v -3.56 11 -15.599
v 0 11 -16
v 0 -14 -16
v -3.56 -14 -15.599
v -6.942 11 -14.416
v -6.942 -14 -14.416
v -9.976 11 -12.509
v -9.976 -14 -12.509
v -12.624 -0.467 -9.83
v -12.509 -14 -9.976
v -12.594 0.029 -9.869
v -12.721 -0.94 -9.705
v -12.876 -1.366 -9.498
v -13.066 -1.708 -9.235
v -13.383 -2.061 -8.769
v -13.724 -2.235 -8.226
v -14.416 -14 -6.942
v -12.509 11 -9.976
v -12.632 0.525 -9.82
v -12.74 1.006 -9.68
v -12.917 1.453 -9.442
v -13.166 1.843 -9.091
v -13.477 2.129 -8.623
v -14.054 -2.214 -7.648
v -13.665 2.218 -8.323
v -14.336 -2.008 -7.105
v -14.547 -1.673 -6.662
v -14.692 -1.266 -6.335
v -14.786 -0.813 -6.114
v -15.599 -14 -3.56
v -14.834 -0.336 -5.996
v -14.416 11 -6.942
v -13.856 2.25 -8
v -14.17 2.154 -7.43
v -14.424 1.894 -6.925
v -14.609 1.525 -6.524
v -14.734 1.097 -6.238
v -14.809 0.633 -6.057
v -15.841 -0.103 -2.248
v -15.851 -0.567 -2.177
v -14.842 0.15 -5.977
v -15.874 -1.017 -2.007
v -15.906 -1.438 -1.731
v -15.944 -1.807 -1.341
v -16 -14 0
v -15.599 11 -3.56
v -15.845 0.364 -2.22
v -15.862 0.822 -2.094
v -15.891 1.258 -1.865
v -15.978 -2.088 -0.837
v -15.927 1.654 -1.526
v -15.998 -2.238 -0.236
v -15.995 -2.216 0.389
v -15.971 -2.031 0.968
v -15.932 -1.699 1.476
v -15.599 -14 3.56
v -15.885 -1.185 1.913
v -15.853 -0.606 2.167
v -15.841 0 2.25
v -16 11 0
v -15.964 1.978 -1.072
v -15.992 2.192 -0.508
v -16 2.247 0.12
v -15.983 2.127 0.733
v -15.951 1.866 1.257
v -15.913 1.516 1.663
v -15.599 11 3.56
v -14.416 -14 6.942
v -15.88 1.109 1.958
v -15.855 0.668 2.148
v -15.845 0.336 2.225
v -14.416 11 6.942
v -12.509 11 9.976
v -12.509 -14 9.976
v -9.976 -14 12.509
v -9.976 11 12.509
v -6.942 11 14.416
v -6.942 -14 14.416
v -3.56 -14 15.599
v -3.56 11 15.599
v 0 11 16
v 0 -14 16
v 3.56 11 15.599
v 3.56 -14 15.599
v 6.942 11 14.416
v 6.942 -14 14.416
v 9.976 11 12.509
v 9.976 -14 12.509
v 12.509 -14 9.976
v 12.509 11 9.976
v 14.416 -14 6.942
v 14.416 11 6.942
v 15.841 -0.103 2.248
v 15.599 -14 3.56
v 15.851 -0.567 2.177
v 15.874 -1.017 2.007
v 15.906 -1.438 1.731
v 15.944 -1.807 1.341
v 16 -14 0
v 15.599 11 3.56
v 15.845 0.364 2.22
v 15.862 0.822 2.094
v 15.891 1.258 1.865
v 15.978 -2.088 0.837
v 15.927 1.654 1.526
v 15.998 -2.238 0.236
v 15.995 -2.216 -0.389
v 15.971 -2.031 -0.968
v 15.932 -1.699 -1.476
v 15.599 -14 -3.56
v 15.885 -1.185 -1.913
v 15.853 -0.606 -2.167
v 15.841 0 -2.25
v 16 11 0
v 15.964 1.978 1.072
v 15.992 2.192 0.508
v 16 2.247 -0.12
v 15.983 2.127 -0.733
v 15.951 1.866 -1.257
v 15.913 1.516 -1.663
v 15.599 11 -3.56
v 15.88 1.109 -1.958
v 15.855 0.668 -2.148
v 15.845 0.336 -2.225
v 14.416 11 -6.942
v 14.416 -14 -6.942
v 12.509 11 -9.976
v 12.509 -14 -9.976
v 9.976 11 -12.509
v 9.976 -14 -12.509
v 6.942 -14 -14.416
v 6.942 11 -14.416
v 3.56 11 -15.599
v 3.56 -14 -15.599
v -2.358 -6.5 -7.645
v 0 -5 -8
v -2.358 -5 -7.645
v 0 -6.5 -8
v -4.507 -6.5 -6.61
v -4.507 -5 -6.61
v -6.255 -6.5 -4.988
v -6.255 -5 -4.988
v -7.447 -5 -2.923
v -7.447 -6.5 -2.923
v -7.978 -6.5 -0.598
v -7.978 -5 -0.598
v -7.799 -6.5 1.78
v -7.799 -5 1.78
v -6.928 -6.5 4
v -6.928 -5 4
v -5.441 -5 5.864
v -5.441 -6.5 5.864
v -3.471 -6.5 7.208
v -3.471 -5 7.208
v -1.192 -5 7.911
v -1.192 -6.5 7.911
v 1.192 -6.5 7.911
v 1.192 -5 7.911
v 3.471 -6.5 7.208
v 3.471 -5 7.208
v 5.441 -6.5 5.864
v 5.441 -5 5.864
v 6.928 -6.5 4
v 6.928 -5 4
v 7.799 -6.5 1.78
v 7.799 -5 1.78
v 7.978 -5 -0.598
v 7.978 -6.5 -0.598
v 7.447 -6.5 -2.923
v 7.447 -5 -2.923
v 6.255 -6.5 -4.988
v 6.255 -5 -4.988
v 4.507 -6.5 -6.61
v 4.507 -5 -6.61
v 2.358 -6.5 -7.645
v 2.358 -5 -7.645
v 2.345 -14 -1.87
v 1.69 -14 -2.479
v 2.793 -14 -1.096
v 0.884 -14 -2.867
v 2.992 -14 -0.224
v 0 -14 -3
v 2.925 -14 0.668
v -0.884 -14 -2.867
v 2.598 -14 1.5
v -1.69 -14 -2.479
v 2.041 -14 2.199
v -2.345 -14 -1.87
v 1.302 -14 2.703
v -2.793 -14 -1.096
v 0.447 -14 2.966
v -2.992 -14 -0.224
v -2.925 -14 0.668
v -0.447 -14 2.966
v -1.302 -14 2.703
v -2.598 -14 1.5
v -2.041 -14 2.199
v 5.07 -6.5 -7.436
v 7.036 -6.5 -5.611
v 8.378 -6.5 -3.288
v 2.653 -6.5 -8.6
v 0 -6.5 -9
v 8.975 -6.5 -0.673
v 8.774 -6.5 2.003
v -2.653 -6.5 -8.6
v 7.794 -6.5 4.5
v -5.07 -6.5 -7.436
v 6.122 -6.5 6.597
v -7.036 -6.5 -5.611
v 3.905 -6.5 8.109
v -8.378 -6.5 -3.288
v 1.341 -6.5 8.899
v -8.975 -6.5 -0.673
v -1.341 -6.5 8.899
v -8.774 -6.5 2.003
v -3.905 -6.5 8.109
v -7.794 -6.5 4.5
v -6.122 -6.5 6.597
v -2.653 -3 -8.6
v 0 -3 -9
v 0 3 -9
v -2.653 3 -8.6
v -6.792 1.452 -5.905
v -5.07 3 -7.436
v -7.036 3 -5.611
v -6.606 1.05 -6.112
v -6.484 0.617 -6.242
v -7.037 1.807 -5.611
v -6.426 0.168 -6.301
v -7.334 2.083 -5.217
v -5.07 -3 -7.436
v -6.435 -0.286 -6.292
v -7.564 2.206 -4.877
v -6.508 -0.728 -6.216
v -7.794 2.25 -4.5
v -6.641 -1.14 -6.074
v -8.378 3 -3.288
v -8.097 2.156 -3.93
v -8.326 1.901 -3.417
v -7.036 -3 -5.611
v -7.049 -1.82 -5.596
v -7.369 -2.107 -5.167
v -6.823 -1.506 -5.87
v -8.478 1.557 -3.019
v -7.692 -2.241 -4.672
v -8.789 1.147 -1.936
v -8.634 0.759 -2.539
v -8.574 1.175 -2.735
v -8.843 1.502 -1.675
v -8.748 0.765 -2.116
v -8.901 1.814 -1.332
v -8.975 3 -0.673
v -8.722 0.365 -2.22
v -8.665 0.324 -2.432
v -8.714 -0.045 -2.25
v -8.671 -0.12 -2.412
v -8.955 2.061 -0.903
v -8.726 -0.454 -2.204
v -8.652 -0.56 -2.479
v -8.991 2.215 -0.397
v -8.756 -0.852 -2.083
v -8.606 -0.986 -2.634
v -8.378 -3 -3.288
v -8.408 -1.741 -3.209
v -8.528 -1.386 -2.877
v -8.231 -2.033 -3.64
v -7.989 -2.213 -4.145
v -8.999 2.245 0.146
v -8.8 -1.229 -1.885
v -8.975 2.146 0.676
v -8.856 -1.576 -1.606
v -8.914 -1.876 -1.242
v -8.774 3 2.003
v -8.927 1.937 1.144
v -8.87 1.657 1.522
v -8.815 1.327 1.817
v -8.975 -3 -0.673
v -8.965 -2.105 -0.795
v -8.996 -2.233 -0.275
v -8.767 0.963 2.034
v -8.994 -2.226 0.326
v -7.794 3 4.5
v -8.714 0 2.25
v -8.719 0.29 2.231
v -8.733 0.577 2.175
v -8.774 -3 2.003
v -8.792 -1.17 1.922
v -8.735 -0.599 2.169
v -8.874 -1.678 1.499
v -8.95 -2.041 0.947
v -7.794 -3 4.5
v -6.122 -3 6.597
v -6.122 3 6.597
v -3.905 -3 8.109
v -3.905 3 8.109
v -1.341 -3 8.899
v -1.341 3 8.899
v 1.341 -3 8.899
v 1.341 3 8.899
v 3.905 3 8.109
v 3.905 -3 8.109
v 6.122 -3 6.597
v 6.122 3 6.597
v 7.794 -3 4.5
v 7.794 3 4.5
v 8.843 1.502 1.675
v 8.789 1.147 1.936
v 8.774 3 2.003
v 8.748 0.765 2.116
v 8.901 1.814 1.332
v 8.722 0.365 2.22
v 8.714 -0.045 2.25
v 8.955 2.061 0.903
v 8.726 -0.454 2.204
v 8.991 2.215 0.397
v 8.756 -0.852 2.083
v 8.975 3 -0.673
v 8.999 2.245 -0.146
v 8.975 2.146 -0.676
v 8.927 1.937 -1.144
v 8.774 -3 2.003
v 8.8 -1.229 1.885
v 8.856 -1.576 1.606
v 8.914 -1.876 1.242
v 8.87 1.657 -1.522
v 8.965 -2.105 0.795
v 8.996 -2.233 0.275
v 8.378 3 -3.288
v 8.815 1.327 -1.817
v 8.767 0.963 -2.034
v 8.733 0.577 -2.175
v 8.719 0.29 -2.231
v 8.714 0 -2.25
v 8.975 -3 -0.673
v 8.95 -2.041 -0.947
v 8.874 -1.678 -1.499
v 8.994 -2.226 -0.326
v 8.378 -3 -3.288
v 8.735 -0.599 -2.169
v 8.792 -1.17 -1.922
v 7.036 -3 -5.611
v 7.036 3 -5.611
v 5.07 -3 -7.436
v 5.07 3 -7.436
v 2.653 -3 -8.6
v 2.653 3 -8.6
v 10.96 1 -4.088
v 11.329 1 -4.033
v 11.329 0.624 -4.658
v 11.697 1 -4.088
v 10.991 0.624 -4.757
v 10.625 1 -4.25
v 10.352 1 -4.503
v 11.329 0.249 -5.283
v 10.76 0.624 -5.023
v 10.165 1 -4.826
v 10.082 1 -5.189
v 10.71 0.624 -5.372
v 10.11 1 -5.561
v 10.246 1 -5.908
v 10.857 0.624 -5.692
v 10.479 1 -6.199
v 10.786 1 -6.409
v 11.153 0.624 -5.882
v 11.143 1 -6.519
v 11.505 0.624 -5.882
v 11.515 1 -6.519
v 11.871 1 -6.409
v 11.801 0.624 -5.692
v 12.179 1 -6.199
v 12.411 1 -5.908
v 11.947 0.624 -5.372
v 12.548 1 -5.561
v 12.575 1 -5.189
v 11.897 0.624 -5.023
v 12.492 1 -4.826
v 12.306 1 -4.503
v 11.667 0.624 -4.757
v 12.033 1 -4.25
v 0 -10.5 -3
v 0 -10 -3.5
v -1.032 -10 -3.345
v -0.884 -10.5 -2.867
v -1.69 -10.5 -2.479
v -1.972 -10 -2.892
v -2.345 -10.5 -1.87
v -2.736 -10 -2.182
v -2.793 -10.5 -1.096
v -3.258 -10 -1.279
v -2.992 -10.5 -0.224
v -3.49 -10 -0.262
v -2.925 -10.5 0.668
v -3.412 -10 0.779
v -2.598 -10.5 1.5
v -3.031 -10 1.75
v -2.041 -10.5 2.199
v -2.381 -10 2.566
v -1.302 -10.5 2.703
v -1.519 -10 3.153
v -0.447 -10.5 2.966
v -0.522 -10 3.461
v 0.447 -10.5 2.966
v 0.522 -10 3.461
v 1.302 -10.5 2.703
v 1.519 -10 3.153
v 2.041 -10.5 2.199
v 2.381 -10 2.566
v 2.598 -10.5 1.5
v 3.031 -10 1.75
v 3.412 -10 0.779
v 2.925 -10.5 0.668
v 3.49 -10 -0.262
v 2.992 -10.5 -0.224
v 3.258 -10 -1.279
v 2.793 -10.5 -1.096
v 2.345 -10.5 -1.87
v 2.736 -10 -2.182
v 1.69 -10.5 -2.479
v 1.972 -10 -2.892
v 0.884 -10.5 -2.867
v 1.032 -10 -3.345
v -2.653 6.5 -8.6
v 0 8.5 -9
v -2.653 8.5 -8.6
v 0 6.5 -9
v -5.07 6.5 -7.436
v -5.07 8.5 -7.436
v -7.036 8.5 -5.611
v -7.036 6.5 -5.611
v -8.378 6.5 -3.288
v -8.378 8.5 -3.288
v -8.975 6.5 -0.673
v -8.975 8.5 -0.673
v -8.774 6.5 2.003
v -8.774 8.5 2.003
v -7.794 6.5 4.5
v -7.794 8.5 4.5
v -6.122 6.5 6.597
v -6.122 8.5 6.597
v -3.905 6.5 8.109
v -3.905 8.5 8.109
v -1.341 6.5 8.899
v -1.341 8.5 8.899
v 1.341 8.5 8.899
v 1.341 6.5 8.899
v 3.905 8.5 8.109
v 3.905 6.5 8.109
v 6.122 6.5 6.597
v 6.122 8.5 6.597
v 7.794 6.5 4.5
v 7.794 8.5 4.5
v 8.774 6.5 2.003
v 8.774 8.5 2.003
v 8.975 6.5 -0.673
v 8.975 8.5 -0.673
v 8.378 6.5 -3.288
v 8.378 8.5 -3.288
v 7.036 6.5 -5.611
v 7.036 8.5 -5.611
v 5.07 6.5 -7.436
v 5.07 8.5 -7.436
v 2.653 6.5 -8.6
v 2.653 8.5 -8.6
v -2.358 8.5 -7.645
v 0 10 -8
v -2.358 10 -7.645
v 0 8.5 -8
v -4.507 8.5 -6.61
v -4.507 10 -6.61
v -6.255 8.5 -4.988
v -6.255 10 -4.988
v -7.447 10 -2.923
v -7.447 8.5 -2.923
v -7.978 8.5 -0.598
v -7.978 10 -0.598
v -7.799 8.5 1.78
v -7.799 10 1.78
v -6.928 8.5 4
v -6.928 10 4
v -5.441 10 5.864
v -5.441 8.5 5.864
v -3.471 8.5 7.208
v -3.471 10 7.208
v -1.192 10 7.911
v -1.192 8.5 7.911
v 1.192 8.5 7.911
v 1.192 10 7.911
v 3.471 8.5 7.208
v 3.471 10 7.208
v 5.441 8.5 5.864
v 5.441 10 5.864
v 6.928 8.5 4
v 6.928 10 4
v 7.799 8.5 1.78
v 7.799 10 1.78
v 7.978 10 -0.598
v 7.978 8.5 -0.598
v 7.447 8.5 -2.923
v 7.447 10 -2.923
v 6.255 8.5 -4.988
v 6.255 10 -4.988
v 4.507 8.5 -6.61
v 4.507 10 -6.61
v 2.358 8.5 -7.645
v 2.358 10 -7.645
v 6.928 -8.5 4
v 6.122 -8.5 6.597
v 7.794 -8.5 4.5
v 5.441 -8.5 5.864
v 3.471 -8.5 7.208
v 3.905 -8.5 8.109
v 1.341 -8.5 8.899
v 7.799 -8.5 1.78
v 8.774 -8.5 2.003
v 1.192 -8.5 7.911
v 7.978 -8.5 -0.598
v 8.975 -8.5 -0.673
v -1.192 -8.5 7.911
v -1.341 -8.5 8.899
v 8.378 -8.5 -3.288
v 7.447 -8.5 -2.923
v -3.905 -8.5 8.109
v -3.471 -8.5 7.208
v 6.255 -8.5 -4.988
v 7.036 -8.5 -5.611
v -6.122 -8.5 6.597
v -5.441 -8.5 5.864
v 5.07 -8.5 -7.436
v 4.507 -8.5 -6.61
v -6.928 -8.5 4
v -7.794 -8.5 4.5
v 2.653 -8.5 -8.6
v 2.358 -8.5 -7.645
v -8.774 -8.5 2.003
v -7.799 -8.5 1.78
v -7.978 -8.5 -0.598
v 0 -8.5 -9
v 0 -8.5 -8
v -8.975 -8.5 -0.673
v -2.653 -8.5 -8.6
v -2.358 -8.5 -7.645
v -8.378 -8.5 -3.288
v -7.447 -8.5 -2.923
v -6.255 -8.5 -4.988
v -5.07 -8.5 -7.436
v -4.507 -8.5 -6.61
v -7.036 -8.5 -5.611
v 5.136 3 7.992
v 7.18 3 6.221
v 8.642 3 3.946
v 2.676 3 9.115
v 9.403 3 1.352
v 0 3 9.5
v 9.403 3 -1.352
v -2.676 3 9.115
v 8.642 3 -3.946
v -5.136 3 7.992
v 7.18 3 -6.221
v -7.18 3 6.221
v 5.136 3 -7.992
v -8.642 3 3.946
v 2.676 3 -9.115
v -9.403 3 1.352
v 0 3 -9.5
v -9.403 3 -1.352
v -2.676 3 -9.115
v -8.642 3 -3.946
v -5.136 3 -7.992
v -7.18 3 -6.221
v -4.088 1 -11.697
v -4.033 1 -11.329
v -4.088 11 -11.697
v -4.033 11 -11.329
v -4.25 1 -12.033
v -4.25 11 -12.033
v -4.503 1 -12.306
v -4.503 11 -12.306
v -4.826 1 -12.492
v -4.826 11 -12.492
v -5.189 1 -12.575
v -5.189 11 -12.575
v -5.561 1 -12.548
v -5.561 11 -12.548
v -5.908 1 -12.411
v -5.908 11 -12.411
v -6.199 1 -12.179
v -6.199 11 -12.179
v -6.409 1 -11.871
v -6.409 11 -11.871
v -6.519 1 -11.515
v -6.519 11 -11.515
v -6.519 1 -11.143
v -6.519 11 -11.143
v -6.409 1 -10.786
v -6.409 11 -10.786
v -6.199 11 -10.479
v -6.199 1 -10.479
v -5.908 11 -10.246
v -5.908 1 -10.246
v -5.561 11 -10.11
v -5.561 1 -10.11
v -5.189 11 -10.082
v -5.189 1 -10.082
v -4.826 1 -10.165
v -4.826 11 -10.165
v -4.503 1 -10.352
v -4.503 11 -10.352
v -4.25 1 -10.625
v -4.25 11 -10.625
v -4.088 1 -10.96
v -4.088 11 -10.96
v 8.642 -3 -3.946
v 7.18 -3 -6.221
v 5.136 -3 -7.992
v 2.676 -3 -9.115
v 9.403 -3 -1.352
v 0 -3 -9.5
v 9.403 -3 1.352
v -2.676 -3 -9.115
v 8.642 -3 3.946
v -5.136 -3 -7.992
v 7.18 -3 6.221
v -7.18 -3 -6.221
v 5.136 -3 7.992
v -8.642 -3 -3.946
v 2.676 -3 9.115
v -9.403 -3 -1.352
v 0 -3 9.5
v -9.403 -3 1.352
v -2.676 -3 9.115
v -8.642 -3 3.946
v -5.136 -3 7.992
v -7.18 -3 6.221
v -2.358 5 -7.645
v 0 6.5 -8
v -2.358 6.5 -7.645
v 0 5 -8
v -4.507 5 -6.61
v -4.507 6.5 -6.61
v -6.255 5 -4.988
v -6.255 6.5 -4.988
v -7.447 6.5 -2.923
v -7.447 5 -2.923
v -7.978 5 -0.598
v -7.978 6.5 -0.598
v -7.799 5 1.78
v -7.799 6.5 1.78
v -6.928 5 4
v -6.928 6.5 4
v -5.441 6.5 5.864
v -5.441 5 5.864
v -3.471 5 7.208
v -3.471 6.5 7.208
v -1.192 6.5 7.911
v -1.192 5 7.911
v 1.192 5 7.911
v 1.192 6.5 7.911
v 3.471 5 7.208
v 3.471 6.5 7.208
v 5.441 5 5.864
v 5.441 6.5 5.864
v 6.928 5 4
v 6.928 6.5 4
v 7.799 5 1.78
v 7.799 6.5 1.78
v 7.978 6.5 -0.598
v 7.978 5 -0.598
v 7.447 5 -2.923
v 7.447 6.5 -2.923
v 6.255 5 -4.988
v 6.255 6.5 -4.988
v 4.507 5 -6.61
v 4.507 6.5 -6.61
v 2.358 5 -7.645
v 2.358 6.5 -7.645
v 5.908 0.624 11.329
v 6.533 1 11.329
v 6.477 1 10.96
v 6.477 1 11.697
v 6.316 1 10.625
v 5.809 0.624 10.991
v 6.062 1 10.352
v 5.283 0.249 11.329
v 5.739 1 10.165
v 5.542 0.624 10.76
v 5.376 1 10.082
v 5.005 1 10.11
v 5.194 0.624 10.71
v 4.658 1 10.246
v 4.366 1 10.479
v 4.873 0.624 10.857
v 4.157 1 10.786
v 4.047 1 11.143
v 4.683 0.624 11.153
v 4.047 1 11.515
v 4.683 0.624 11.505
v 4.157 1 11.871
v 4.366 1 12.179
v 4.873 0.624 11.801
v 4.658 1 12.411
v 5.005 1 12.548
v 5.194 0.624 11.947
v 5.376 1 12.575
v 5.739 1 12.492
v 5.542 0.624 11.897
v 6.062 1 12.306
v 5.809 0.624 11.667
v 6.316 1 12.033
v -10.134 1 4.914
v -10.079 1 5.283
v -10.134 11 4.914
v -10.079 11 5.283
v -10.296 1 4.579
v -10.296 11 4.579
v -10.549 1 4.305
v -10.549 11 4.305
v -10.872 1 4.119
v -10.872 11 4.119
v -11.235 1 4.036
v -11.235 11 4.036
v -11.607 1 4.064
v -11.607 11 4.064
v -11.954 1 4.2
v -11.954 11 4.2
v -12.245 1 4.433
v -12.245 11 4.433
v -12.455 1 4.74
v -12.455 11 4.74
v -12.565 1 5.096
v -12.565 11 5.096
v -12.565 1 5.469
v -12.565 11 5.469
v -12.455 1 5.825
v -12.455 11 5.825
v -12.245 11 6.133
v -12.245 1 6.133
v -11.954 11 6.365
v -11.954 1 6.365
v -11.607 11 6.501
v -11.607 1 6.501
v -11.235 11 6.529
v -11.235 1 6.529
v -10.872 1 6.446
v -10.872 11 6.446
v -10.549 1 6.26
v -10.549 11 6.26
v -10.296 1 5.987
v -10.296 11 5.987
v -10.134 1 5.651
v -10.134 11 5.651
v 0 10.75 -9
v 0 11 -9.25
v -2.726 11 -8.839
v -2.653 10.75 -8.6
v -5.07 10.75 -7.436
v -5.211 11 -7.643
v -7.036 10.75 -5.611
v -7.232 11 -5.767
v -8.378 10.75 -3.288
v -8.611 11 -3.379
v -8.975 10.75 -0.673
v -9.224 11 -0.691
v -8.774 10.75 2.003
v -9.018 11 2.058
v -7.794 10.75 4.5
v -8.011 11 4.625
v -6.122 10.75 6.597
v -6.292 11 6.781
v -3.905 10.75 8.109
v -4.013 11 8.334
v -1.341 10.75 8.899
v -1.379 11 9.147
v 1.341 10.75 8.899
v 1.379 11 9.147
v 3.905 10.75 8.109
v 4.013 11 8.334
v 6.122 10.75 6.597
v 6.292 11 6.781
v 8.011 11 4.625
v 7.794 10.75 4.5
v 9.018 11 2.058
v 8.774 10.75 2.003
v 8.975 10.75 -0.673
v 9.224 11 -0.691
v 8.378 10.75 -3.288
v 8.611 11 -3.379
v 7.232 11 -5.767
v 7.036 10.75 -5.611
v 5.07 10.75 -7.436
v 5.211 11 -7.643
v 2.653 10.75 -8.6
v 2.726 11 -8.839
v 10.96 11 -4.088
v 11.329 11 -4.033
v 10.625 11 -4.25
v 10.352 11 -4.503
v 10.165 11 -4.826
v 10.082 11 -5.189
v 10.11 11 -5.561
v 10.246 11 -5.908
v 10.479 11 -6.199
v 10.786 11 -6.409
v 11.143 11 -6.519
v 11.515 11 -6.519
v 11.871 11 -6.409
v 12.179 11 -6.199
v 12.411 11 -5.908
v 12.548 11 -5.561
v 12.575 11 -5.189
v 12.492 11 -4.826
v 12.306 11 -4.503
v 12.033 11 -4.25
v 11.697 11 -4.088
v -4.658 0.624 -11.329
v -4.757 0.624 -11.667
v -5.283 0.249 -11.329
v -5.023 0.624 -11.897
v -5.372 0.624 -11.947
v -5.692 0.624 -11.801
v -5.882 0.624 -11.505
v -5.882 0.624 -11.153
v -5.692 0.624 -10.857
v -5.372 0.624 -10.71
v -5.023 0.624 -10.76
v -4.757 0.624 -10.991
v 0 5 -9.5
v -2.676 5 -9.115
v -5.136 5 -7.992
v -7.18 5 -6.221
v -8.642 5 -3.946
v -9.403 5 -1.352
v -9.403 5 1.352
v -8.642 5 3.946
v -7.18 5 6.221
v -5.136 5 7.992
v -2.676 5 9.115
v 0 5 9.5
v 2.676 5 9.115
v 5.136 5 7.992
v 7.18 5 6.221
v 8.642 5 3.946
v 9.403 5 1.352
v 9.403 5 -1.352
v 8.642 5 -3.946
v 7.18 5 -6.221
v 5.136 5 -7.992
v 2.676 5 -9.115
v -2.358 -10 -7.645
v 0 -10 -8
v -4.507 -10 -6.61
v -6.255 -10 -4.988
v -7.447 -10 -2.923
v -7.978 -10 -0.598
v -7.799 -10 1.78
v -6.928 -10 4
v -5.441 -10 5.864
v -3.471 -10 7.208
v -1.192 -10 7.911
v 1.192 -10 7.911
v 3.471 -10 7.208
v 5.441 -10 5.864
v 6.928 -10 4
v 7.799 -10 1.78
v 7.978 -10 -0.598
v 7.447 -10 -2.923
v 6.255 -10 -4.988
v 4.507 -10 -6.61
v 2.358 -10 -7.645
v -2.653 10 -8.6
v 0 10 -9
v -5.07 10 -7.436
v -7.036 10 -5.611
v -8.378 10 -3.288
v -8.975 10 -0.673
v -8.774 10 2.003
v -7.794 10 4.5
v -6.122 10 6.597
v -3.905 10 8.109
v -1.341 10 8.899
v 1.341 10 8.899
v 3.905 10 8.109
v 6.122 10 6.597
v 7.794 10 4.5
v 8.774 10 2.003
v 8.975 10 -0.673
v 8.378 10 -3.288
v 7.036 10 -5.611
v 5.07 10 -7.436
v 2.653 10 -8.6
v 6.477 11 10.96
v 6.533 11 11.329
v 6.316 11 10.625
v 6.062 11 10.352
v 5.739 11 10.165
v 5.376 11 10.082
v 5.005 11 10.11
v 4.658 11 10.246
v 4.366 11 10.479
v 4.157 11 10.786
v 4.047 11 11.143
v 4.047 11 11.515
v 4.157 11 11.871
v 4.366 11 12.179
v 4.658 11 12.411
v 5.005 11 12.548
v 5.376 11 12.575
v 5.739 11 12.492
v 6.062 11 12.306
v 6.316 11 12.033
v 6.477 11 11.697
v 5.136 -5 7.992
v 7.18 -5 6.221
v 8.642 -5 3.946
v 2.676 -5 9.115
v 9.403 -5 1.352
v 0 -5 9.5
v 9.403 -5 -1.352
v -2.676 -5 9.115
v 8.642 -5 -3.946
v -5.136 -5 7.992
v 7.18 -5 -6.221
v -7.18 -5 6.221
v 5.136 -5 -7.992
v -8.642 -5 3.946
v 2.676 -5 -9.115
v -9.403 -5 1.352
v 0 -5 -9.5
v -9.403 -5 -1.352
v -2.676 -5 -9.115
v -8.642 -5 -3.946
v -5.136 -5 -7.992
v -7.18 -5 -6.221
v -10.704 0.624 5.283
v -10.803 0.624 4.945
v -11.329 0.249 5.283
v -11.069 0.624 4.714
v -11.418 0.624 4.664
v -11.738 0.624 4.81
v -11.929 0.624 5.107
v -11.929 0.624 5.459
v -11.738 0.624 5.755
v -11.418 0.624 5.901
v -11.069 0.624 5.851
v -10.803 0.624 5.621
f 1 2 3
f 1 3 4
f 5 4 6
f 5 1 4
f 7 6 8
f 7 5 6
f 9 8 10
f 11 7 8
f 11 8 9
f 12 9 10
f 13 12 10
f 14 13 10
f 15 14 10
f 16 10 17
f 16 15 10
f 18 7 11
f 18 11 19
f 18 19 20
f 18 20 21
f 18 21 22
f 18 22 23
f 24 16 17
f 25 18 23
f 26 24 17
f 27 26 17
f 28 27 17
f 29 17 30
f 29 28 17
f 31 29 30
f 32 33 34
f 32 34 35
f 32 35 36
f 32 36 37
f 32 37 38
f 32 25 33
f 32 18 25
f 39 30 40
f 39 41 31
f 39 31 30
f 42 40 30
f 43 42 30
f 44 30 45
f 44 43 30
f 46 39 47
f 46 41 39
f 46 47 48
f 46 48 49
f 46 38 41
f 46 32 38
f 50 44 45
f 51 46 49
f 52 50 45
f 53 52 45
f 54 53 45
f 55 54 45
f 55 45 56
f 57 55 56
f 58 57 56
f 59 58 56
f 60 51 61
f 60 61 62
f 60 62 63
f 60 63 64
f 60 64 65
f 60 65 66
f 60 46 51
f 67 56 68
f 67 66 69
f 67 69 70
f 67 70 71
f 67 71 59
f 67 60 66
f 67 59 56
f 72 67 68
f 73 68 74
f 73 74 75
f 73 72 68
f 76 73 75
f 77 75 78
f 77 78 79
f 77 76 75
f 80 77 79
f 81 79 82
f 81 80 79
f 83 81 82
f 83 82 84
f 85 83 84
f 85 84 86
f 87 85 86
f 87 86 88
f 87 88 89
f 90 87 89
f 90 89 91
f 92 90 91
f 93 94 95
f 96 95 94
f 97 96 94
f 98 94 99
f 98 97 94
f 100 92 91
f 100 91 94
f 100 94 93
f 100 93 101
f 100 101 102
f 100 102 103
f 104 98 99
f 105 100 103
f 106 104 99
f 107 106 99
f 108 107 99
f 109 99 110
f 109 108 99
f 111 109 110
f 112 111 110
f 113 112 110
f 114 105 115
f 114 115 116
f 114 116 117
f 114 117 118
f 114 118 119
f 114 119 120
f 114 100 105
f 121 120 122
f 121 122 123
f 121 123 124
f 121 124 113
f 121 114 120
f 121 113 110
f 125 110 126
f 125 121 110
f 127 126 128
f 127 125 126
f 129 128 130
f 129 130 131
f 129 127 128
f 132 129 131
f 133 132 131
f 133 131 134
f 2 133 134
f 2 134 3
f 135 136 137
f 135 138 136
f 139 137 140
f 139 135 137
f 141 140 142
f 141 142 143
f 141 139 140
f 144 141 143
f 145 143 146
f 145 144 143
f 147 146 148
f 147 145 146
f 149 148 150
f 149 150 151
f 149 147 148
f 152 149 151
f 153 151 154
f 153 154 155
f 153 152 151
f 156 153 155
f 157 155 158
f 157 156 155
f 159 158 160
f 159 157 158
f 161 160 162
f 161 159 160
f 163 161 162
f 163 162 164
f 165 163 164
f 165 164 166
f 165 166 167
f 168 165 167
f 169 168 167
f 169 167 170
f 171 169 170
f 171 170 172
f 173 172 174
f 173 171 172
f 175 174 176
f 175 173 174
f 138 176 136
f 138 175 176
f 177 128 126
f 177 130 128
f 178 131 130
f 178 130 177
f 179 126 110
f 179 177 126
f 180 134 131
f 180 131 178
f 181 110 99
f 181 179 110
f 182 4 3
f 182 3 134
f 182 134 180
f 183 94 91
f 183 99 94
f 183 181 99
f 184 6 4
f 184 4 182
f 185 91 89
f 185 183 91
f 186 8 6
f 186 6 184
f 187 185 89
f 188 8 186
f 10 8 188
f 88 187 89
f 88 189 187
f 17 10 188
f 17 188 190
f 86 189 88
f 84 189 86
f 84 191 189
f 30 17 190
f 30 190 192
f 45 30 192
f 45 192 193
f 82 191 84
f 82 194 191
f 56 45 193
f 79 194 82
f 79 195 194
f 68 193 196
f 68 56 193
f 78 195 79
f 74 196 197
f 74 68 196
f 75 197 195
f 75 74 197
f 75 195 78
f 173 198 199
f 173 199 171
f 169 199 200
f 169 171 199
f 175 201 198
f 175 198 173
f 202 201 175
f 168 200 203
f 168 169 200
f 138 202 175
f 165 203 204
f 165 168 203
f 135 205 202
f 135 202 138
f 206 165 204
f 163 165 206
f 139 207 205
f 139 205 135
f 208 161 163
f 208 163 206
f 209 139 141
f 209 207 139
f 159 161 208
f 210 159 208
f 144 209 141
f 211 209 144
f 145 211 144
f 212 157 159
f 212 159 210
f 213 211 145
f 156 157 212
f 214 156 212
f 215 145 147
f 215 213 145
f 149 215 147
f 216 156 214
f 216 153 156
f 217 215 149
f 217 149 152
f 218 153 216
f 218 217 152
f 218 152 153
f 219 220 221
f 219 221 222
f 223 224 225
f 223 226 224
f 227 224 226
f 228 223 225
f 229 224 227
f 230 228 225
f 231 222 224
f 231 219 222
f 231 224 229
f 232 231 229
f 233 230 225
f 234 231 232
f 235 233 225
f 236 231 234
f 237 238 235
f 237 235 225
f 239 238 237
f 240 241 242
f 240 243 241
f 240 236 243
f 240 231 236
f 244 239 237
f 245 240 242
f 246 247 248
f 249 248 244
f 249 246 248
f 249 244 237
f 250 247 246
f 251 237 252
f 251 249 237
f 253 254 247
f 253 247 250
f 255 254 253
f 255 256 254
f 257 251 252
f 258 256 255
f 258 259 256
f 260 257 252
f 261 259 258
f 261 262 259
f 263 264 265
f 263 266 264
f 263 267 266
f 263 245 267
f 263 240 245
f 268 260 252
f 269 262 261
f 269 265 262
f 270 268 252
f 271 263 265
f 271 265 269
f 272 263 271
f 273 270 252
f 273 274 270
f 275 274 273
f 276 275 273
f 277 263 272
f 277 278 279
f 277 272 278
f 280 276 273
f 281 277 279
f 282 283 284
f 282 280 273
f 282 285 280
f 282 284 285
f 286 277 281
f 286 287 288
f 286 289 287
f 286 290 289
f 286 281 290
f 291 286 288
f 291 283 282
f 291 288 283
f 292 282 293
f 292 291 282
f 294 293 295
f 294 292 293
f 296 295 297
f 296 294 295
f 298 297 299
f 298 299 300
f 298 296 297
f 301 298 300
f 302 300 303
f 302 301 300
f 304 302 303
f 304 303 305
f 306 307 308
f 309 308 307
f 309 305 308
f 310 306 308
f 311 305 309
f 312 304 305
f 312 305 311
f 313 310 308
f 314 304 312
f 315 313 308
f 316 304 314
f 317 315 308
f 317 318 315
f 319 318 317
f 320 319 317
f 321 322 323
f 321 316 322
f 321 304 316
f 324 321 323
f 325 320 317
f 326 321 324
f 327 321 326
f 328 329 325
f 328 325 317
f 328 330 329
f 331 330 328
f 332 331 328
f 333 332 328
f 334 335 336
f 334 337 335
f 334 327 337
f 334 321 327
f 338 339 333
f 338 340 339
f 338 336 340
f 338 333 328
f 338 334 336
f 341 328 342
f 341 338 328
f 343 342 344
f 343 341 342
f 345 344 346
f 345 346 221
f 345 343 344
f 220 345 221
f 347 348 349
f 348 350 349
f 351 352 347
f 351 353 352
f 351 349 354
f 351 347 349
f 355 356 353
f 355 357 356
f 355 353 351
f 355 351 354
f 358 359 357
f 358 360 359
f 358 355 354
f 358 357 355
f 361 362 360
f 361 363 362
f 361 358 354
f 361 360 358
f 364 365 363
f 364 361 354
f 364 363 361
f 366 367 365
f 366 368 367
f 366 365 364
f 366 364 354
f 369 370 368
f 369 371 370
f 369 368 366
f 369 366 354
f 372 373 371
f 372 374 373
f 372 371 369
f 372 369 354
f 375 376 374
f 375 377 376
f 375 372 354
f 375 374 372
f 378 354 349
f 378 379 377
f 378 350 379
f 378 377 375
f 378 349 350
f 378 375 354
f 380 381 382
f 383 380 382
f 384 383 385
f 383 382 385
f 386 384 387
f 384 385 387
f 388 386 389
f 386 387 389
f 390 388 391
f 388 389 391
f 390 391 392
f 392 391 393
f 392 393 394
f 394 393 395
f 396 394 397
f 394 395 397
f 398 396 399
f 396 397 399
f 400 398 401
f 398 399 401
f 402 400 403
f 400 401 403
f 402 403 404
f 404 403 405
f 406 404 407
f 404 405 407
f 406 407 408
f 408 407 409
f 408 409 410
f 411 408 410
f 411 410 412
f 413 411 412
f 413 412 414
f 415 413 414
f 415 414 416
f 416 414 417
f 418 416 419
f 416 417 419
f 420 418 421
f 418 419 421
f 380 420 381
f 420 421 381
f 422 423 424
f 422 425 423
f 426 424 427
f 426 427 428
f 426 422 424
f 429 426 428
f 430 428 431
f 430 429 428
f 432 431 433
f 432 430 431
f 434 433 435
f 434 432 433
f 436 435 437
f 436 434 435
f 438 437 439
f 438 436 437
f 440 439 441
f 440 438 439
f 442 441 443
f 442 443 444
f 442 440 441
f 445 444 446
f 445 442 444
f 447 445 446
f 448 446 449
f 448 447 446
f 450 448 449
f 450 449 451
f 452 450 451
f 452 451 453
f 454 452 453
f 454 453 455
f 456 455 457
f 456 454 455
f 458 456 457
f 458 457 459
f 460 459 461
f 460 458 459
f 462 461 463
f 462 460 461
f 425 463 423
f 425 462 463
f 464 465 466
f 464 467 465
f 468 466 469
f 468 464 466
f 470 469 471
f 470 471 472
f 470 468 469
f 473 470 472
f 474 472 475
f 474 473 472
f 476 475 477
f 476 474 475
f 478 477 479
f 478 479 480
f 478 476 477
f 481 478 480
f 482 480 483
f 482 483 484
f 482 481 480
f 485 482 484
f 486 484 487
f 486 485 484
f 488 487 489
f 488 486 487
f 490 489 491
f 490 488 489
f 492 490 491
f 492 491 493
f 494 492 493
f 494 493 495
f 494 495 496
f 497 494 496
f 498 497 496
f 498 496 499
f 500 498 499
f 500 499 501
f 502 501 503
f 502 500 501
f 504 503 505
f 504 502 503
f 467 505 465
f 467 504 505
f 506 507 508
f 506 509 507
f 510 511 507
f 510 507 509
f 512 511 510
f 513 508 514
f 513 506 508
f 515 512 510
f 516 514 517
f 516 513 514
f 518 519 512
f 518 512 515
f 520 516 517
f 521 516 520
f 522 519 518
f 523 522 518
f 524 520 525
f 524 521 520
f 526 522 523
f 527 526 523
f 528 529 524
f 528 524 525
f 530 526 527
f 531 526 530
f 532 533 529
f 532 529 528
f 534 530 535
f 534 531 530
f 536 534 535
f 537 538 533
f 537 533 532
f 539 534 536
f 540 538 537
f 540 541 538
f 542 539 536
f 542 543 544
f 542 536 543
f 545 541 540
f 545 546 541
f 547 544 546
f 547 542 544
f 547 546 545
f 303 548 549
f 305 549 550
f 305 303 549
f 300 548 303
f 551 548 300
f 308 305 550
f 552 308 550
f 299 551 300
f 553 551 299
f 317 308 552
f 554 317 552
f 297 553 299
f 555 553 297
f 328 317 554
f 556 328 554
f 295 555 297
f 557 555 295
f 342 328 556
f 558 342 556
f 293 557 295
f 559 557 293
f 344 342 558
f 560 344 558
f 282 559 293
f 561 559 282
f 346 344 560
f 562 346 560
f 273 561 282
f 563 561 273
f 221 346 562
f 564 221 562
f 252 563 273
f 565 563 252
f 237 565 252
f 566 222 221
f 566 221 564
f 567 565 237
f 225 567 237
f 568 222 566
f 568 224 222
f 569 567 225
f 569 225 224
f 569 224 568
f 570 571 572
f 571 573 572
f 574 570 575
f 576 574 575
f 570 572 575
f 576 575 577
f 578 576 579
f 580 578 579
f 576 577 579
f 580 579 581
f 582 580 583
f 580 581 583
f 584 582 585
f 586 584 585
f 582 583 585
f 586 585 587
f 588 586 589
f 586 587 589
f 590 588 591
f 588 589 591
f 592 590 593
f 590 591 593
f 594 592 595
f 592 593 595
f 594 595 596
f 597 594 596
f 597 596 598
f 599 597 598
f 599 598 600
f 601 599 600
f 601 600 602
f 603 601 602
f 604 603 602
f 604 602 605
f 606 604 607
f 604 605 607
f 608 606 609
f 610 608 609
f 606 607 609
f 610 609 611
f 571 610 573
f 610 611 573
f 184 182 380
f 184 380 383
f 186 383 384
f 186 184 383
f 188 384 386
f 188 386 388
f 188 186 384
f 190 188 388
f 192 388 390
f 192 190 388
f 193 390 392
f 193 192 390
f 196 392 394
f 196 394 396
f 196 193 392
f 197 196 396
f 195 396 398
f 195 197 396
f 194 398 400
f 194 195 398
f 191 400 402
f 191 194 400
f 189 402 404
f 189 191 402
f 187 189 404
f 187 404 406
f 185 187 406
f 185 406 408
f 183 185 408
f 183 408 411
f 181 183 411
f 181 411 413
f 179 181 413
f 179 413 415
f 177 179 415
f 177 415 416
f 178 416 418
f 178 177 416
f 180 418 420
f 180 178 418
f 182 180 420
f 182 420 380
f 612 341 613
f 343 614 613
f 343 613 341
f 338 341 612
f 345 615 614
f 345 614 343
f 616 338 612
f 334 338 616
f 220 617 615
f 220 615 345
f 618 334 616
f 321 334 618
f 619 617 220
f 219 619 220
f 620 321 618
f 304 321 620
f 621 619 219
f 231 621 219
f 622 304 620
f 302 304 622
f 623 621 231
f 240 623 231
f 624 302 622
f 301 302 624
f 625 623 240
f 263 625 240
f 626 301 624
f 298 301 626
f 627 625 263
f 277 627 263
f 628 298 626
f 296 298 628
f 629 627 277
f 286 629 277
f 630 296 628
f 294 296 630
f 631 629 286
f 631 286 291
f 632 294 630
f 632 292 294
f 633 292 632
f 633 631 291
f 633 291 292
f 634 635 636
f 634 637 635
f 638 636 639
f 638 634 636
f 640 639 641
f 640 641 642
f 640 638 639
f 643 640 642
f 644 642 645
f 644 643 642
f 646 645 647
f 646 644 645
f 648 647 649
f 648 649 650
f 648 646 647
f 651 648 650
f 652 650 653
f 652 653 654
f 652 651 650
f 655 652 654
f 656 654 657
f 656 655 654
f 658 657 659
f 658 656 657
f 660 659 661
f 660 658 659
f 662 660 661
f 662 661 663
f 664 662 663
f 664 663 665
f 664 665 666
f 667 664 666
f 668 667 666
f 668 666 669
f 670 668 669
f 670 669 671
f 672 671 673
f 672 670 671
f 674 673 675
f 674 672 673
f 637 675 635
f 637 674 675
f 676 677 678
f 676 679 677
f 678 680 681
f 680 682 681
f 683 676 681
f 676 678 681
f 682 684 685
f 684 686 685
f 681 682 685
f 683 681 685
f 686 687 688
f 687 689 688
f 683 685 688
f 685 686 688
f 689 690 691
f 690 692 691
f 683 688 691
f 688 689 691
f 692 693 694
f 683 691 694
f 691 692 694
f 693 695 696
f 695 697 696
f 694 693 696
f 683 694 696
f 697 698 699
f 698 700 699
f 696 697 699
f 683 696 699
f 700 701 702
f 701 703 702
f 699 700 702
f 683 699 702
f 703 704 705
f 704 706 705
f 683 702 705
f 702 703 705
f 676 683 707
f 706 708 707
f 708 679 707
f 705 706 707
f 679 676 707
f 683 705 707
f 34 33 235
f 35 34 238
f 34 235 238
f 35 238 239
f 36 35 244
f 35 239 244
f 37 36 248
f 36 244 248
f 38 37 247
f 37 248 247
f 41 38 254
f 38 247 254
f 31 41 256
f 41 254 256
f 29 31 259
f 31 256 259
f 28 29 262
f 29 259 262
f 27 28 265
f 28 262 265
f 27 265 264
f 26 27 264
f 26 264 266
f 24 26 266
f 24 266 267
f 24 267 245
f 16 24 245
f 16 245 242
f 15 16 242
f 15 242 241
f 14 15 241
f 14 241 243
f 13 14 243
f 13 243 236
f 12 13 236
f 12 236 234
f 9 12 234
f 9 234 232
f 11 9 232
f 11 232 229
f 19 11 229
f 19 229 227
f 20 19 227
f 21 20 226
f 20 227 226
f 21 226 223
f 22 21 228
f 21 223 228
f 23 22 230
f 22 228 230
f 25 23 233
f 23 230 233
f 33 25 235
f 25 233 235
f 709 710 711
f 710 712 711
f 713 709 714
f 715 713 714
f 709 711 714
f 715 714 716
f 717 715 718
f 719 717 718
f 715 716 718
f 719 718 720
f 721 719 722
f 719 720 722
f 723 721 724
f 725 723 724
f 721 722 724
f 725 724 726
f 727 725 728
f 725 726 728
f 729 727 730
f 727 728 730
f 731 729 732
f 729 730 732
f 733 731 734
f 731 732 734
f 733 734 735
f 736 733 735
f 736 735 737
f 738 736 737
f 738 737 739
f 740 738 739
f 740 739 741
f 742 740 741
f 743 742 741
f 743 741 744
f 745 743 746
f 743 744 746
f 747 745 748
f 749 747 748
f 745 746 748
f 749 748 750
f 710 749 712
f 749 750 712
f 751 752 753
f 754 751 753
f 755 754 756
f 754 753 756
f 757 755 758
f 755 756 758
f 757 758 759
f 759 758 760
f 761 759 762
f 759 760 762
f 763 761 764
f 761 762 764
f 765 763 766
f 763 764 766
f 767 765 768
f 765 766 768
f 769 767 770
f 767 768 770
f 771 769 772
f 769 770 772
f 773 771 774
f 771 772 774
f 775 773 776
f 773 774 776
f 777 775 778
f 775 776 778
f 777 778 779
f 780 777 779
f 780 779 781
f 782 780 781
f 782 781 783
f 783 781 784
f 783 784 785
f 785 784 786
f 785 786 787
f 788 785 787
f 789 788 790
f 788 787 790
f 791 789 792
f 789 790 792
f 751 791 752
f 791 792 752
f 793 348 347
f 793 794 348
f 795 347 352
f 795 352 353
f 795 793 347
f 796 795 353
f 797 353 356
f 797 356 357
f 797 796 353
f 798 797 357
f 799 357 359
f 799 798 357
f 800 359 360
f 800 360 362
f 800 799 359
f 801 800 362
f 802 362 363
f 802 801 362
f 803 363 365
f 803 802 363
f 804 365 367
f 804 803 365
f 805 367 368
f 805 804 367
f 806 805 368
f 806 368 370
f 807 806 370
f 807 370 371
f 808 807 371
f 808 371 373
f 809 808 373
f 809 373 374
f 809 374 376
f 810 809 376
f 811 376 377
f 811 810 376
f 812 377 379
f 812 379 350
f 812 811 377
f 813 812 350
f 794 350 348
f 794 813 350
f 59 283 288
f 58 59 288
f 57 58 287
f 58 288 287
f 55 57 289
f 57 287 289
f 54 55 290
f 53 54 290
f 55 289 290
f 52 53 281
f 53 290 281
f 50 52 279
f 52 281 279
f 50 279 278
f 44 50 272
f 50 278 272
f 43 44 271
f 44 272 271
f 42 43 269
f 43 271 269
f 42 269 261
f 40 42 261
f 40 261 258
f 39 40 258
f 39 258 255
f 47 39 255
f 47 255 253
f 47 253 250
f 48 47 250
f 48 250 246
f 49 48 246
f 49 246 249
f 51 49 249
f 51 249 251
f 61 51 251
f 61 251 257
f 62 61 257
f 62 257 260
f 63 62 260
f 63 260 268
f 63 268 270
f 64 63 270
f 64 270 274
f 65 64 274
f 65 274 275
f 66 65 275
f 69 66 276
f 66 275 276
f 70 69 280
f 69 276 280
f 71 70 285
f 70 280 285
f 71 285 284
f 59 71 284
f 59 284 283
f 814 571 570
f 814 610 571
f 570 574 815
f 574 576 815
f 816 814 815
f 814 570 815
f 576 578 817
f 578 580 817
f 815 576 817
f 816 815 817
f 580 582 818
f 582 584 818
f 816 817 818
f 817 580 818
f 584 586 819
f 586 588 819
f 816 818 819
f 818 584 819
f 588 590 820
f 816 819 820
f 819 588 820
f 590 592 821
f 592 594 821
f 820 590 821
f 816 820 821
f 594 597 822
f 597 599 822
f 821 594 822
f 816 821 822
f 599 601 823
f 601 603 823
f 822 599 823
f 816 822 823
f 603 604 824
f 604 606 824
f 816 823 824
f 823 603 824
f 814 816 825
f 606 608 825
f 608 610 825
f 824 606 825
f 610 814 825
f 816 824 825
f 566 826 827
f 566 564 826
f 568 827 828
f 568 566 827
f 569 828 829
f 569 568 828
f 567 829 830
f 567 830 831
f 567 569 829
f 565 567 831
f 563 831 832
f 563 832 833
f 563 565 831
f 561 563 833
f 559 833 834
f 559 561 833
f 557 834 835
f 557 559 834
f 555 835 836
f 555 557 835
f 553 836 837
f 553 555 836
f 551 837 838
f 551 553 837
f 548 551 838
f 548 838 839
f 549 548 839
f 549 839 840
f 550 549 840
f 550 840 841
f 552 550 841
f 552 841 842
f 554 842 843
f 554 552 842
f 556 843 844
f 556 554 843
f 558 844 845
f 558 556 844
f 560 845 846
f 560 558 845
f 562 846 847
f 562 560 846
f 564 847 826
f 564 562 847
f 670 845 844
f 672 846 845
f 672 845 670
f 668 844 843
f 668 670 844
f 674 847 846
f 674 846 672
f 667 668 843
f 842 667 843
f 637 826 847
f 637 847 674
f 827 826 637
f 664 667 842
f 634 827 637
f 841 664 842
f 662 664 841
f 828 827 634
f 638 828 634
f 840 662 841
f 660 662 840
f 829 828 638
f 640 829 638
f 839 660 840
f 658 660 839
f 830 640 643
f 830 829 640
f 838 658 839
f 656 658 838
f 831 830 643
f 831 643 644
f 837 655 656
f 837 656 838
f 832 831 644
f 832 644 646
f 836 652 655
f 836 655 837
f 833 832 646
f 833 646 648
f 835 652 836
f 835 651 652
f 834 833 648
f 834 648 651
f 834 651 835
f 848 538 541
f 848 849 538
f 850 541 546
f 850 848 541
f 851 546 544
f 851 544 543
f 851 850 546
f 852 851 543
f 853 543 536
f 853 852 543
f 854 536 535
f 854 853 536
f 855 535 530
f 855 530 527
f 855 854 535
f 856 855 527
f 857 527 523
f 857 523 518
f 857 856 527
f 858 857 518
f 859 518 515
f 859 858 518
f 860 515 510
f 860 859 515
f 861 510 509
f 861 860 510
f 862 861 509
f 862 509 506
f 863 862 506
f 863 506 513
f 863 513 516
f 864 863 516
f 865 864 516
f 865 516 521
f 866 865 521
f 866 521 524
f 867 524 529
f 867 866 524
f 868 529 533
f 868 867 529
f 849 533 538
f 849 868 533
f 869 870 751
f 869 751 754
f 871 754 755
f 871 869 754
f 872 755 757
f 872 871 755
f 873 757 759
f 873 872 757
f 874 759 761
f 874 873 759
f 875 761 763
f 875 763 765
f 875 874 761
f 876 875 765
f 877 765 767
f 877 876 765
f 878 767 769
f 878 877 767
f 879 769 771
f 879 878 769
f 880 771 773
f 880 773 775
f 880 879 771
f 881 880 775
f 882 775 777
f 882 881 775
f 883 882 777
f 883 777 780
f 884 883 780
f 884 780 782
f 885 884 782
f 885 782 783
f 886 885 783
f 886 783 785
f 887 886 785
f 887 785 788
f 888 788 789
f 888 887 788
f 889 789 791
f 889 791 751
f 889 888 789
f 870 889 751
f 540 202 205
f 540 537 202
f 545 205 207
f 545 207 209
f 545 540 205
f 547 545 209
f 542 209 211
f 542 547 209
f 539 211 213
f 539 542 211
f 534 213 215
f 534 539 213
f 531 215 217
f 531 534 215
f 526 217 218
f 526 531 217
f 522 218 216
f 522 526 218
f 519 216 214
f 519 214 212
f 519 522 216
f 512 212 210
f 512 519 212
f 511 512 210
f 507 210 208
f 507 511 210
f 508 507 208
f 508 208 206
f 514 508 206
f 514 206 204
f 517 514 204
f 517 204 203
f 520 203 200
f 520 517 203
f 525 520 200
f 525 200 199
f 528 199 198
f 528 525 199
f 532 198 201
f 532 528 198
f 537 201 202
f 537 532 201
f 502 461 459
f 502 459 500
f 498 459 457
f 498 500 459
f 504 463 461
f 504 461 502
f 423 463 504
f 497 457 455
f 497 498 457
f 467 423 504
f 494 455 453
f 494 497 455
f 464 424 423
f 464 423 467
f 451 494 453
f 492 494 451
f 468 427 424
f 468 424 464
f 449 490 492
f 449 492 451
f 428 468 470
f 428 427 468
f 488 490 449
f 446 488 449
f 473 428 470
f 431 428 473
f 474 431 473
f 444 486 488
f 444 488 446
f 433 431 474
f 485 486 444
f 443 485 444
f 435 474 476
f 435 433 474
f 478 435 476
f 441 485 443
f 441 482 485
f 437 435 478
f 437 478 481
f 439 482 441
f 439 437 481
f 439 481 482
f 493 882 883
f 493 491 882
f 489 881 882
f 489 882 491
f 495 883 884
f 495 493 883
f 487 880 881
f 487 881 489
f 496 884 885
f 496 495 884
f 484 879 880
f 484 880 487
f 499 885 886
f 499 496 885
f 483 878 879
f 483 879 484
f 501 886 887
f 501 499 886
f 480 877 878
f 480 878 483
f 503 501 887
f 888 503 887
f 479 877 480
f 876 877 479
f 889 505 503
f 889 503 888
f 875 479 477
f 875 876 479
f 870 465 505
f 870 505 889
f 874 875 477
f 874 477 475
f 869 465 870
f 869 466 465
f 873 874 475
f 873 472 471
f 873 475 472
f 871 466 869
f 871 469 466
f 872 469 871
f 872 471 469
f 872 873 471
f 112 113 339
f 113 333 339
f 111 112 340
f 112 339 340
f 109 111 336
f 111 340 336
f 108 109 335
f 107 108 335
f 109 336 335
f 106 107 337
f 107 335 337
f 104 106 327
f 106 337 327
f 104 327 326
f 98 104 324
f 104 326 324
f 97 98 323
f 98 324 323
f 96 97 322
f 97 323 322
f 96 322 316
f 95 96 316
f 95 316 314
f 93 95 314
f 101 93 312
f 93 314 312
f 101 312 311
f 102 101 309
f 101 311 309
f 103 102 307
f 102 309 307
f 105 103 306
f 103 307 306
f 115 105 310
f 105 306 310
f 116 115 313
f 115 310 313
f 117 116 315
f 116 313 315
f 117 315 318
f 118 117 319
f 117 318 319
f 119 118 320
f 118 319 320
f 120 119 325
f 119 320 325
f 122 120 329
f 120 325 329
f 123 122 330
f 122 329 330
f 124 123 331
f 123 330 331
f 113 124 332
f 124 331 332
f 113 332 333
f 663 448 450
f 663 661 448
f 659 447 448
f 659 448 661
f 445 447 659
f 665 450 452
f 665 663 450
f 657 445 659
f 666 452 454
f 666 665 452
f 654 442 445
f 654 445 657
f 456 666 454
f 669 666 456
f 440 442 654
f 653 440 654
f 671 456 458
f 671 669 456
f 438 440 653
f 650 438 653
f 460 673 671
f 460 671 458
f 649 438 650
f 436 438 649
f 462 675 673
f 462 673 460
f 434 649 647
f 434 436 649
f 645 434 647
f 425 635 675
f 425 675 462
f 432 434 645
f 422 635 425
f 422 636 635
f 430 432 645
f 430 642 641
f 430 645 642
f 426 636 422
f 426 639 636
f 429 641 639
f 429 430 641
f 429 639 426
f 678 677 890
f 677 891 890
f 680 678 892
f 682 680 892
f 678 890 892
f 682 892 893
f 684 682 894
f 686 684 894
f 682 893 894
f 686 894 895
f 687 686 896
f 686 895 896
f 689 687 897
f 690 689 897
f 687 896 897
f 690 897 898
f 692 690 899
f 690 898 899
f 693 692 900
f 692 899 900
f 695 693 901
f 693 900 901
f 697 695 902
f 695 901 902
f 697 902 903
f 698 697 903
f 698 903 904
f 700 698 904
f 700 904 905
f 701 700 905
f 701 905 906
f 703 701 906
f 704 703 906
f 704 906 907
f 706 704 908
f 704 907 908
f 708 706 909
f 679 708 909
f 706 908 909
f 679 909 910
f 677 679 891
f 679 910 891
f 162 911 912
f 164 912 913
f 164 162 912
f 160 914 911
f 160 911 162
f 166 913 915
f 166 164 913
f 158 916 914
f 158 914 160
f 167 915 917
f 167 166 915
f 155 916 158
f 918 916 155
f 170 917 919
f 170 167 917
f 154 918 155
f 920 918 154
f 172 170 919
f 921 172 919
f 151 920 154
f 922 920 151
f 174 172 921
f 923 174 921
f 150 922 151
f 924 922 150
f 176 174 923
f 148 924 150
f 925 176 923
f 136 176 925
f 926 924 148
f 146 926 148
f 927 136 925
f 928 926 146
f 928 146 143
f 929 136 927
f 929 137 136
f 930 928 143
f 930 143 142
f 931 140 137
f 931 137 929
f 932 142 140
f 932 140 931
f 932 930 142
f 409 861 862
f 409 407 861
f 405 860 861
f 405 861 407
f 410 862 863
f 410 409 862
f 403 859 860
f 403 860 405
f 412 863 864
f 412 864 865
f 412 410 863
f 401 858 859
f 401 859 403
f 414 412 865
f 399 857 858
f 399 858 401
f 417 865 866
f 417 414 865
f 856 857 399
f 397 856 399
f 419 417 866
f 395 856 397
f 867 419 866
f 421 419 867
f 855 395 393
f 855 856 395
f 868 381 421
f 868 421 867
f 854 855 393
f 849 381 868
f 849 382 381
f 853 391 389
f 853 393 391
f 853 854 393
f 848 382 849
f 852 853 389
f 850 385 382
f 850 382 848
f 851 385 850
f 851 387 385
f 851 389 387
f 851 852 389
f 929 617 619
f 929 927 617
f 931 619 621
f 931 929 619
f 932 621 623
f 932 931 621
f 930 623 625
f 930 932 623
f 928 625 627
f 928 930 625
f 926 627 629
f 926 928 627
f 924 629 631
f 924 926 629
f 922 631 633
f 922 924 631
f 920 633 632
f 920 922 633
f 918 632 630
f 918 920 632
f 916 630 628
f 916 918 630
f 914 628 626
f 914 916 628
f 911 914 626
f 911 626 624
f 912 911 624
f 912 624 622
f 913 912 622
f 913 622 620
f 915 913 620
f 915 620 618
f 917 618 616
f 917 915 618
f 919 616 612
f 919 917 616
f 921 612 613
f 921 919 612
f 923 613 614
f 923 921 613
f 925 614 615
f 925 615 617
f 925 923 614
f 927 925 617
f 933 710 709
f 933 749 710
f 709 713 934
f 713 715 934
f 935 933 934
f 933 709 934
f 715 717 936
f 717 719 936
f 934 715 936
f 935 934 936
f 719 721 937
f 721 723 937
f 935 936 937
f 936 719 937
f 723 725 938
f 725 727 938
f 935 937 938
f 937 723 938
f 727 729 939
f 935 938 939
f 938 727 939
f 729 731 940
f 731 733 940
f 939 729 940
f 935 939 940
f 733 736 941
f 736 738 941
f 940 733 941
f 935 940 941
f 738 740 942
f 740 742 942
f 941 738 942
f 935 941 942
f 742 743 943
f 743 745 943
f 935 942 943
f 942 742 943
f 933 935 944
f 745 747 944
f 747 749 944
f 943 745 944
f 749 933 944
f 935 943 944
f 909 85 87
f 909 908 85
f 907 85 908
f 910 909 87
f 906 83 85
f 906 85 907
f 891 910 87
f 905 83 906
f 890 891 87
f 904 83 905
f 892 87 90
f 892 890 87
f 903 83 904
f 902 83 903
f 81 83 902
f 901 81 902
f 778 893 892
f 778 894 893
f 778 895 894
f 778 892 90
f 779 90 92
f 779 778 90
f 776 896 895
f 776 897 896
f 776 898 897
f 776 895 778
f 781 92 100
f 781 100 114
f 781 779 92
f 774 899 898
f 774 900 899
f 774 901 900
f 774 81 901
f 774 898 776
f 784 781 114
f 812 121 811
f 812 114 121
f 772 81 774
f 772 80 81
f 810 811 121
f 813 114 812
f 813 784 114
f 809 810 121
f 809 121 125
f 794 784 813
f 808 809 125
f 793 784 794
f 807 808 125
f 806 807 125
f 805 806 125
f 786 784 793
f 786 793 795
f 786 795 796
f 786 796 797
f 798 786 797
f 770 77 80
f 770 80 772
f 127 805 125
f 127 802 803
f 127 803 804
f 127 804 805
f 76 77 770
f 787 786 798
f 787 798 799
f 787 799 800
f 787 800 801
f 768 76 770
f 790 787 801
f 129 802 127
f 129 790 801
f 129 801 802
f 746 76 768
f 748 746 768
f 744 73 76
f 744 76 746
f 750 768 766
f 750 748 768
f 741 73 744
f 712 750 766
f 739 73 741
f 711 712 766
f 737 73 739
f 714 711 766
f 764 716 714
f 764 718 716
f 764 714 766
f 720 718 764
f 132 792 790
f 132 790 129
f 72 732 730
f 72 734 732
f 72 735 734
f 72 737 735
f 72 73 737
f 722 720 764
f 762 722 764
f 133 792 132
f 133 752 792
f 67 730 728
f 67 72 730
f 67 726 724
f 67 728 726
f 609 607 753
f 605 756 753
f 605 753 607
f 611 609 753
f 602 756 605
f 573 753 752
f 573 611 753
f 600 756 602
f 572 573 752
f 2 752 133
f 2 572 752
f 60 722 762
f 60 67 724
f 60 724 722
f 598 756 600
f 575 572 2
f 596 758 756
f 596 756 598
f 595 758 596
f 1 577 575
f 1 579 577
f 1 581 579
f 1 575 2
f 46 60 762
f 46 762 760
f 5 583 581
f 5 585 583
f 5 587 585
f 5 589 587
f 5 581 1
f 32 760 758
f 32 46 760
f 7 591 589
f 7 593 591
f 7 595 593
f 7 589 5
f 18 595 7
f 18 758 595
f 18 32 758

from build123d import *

# Parameters (mm, degrees)
ESBO_O4_W                        = 2.25
ESBO_O4_H                        = 16
F_4_5_4_5_DIAMETER_HOLE2_D       = 4.5
F_4_5_4_5_DIAMETER_HOLE2_DEPTH   = 18
F_4_5_4_5_DIAMETER_HOLE2_TIP     = 1.351936393
ESBO_O12_R                       = 16
ESBO_O12_R_2                     = 9
RESSALTO_EXTRUS_O1_DEPTH         = 1
CHANFRO1_SIZE                    = 0.5
CHANFRO2_SIZE                    = 0.25
FURO_DE_DI_METRO_4_5_4_5_2_D     = 4.5
FURO_DE_DI_METRO_4_5_4_5_2_DEPTH = 8
FURO_DE_DI_METRO_4_5_4_5_2_TIP   = 1.351936393


# Read off the part's stored shape, not the designer's step: PadrãoCircular5
with BuildPart() as part:
    # Esboço1 → Revolução1 (revolve)
    with BuildSketch(Plane.XY, mode=Mode.PRIVATE) as revolu_o1_sk:
        Polygon((3, -14), (16, -14), (16, 10), (8, 10), (8, 8.5), (9, 8.5), (9, 6.5), (8, 6.5), (8, 5), (9.5, 5), (9.5, 3), (9, 3), (9, -3), (9.5, -3), (9.5, -5), (8, -5), (8, -6.5), (9, -6.5), (9, -8.5), (8, -8.5), (8, -10), (3, -10), align=None)
    revolve(revolu_o1_sk.sketch.rotate(Axis((0, -14, 0), (0, 1, 0)), 90), axis=Axis((0, -14, 0), (0, 1, 0)))

    # Esboço4 → Furo de diâmetro Ø4.5 (4.5)1 (revolve, cut)
    with BuildSketch(Plane(origin=(16, 0, 0), x_dir=(0, 0, -1), z_dir=(0, 1, 0))):
        with Locations((1.125, 8)):
            Rectangle(ESBO_O4_W, ESBO_O4_H)
    revolve(axis=Axis((22.35, 0, 0), (-1, 0, 0)), mode=Mode.SUBTRACT)

    # Ø4.5 (4.5) Diameter Hole2
    with Locations(Plane(origin=(-13.856406461, 0, -8), x_dir=(0, -1, 0), z_dir=(-0.8660254037844364, 0, -0.5000000000000041))):
        with Locations((0, 0)):
            Hole(F_4_5_4_5_DIAMETER_HOLE2_D / 2, depth=F_4_5_4_5_DIAMETER_HOLE2_DEPTH)
            with Locations((0, 0, -(F_4_5_4_5_DIAMETER_HOLE2_DEPTH + F_4_5_4_5_DIAMETER_HOLE2_TIP / 2))):  # 118° drill point
                Cone(0, F_4_5_4_5_DIAMETER_HOLE2_D / 2, F_4_5_4_5_DIAMETER_HOLE2_TIP, mode=Mode.SUBTRACT)

    # Esboço12 → Ressalto-extrusão1 (add)
    with BuildSketch(Plane(origin=(0, 10, 0), x_dir=(1, 0, 0), z_dir=(0, 1, 0))):
        with Locations(Location((0, 0, 0), (0, 0, 90))):
            Circle(ESBO_O12_R)
        with Locations(Location((0, 0, 0), (0, 0, 90))):
            Circle(ESBO_O12_R_2, mode=Mode.SUBTRACT)
    extrude(amount=RESSALTO_EXTRUS_O1_DEPTH)

    # Esboço13 → Furo roscado de M3x0.51 (revolve, cut)
    with BuildSketch(Plane(origin=(11.328847338, 11, -5.282728272), x_dir=(0, 0, 1), z_dir=(1, 0, 0))):
        Polygon((0, 0), (0, 10.751075774), (1.25, 10), (1.25, 0), align=None)
    revolve(axis=Axis((11.328847338, 17.35, -5.282728272), (0, -1, 0)), mode=Mode.SUBTRACT)

    # PadrãoCircular5 outline → PadrãoCircular5 (revolve, cut)
    with BuildSketch(Plane(origin=(5.282728272, 0, 11.328847338), x_dir=(1, 0, 0), z_dir=(0, 0, 1))):
        Polygon((0, 11), (0, 0.248924226), (1.25, 1), (1.25, 11), align=None)
    revolve(axis=Axis((5.282728272, 0, 11.328847338), (0, 1, 0)), mode=Mode.SUBTRACT)

    # Padr_oCircular5 2 outline → Padr_oCircular5 2 (revolve, cut)
    with BuildSketch(Plane(origin=(-11.328847338, 0, 5.282728272), x_dir=(1, 0, 0), z_dir=(0, 0, 1))):
        Polygon((0, 11), (0, 0.248924226), (1.25, 1), (1.25, 11), align=None)
    revolve(axis=Axis((-11.328847338, 0, 5.282728272), (0, 1, 0)), mode=Mode.SUBTRACT)

    # Padr_oCircular5 3 outline → Padr_oCircular5 3 (revolve, cut)
    with BuildSketch(Plane(origin=(-5.282728272, 0, -11.328847338), x_dir=(1, 0, 0), z_dir=(0, 0, 1))):
        Polygon((0, 11), (0, 0.248924226), (1.25, 1), (1.25, 11), align=None)
    revolve(axis=Axis((-5.282728272, 0, -11.328847338), (0, 1, 0)), mode=Mode.SUBTRACT)

    # Chanfro1
    chanfro1_edges = [part.edges().sort_by_distance(p)[0] for p in [
        (0, -10, 3),
    ]]
    chamfer(chanfro1_edges, length=CHANFRO1_SIZE)

    # Chanfro2
    chanfro2_edges = [part.edges().sort_by_distance(p)[0] for p in [
        (0, 11, 9),
    ]]
    chamfer(chanfro2_edges, length=CHANFRO2_SIZE)

    # Furo de diâmetro Ø4.5 (4.5)2
    with Locations(Plane(origin=(-16, 0, 0), x_dir=(0, 0, -1), z_dir=(-1, 0, 0))):
        with Locations((0, 0)):
            Hole(FURO_DE_DI_METRO_4_5_4_5_2_D / 2, depth=FURO_DE_DI_METRO_4_5_4_5_2_DEPTH)
            with Locations((0, 0, -(FURO_DE_DI_METRO_4_5_4_5_2_DEPTH + FURO_DE_DI_METRO_4_5_4_5_2_TIP / 2))):  # 118° drill point
                Cone(0, FURO_DE_DI_METRO_4_5_4_5_2_D / 2, FURO_DE_DI_METRO_4_5_4_5_2_TIP, mode=Mode.SUBTRACT)


solid = part.part
